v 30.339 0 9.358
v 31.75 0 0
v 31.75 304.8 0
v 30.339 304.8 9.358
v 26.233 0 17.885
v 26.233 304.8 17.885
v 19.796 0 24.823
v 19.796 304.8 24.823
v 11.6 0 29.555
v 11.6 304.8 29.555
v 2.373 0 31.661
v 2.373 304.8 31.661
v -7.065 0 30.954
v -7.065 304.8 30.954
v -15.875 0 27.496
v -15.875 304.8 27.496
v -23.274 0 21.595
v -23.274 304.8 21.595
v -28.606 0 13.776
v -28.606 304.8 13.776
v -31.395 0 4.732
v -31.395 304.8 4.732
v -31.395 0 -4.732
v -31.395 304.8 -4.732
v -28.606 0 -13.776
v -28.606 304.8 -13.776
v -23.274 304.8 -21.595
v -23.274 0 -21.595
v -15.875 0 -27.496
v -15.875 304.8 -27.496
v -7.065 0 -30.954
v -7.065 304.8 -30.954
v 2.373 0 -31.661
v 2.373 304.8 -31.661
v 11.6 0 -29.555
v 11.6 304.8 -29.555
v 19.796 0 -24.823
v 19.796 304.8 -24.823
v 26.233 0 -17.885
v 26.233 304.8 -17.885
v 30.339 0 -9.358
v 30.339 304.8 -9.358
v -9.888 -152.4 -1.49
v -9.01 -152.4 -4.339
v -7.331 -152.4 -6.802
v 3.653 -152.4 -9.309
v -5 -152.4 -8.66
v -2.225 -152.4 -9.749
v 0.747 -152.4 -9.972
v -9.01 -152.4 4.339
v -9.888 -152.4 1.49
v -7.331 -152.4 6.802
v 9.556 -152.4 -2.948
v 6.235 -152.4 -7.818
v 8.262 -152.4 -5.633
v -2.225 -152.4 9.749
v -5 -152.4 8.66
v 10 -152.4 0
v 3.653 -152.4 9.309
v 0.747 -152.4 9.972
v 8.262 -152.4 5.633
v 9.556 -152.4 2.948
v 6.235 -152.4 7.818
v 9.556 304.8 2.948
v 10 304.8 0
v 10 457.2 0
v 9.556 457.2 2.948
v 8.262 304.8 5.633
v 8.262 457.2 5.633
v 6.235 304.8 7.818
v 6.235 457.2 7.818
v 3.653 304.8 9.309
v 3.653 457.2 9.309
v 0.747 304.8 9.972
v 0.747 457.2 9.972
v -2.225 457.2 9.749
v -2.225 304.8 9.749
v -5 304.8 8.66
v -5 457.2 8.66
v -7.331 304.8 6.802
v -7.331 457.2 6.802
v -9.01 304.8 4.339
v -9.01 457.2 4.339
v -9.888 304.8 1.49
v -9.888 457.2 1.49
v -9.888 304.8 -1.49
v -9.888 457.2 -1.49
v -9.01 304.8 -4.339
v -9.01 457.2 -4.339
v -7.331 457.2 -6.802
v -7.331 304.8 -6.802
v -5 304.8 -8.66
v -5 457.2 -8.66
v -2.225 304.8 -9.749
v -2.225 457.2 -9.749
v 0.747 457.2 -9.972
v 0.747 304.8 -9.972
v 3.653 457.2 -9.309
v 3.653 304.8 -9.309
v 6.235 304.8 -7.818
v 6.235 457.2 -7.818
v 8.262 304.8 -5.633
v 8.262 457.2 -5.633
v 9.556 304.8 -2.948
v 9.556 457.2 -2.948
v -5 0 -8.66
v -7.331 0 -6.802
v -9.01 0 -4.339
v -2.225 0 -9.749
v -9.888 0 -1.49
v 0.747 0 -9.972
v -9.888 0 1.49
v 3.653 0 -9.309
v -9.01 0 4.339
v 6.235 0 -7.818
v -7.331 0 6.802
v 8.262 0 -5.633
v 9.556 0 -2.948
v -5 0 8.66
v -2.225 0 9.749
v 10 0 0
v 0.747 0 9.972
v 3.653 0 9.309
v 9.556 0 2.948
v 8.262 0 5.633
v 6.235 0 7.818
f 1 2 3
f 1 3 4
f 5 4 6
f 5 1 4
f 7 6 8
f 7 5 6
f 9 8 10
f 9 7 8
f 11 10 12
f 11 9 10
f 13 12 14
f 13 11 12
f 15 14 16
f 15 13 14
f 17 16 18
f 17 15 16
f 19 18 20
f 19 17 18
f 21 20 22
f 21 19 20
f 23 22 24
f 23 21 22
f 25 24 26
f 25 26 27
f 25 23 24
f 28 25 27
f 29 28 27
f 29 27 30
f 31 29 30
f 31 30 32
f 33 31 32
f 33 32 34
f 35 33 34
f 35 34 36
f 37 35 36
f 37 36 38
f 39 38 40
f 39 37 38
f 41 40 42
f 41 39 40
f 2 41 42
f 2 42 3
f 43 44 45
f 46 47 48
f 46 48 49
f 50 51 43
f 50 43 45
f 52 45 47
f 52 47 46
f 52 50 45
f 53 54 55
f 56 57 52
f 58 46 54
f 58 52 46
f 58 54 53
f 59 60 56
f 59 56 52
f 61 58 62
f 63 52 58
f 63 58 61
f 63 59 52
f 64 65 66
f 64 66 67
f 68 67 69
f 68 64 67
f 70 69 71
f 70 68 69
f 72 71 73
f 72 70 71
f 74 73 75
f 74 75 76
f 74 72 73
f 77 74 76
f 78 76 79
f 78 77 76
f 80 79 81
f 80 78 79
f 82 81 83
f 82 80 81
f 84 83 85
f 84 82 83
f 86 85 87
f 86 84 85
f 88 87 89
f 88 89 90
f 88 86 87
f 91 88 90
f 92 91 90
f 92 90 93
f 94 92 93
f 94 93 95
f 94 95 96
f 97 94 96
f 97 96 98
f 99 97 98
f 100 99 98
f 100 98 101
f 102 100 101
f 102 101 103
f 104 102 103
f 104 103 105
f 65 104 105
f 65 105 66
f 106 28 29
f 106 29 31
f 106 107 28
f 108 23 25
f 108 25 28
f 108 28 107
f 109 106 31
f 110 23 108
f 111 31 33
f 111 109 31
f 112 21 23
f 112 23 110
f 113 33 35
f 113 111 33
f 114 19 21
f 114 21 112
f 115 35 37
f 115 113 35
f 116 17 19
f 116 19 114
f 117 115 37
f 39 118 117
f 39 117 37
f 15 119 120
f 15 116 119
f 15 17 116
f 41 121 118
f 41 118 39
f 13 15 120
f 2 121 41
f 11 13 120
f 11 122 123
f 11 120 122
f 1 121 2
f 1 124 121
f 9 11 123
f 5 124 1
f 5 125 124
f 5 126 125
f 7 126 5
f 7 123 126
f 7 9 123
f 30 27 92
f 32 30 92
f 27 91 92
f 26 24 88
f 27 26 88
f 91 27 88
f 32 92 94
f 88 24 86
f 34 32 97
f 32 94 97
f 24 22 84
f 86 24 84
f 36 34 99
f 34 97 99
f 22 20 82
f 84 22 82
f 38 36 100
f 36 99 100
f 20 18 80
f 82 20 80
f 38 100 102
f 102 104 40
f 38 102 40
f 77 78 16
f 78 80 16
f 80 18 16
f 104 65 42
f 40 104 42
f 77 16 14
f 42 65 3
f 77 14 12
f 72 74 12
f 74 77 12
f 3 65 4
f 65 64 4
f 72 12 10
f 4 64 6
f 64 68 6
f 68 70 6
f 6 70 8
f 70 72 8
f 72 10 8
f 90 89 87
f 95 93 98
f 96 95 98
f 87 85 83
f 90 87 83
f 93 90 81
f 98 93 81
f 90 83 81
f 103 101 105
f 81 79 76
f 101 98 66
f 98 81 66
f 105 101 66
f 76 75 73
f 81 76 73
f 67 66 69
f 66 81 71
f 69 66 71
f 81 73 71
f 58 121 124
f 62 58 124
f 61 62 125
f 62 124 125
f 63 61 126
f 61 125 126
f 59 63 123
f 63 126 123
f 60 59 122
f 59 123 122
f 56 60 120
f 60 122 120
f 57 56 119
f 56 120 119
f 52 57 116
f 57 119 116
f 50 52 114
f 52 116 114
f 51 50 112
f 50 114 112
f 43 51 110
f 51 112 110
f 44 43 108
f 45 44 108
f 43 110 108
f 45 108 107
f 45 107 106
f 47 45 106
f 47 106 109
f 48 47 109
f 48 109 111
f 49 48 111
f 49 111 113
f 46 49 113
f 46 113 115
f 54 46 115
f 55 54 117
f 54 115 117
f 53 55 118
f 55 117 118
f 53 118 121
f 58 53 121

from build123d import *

# Parameters (mm, degrees)
F0_R     = 31.75
F0_R_2   = 10
F1_DEPTH = 304.8
F2_DEPTH = 152.4
F3_DEPTH = 609.6


with BuildPart() as f1:
    # F0 (on Front) → F1 (new body)
    with BuildSketch(Plane.XZ):
        Circle(F0_R)
        Circle(F0_R_2, mode=Mode.SUBTRACT)
        Circle(F0_R_2)
    extrude(amount=-F1_DEPTH)

    # F0 (on Front) → F2 (join)
    with BuildSketch(Plane.XZ):
        Circle(F0_R_2)
    extrude(amount=F2_DEPTH)

    # F3 (add): a face of the model
    f3_faces = [f1.faces().sort_by_distance(p)[0] for p in [
        (0, -152.4, 0),
    ]]
    extrude(f3_faces, amount=-F3_DEPTH)


solid = f1.part
